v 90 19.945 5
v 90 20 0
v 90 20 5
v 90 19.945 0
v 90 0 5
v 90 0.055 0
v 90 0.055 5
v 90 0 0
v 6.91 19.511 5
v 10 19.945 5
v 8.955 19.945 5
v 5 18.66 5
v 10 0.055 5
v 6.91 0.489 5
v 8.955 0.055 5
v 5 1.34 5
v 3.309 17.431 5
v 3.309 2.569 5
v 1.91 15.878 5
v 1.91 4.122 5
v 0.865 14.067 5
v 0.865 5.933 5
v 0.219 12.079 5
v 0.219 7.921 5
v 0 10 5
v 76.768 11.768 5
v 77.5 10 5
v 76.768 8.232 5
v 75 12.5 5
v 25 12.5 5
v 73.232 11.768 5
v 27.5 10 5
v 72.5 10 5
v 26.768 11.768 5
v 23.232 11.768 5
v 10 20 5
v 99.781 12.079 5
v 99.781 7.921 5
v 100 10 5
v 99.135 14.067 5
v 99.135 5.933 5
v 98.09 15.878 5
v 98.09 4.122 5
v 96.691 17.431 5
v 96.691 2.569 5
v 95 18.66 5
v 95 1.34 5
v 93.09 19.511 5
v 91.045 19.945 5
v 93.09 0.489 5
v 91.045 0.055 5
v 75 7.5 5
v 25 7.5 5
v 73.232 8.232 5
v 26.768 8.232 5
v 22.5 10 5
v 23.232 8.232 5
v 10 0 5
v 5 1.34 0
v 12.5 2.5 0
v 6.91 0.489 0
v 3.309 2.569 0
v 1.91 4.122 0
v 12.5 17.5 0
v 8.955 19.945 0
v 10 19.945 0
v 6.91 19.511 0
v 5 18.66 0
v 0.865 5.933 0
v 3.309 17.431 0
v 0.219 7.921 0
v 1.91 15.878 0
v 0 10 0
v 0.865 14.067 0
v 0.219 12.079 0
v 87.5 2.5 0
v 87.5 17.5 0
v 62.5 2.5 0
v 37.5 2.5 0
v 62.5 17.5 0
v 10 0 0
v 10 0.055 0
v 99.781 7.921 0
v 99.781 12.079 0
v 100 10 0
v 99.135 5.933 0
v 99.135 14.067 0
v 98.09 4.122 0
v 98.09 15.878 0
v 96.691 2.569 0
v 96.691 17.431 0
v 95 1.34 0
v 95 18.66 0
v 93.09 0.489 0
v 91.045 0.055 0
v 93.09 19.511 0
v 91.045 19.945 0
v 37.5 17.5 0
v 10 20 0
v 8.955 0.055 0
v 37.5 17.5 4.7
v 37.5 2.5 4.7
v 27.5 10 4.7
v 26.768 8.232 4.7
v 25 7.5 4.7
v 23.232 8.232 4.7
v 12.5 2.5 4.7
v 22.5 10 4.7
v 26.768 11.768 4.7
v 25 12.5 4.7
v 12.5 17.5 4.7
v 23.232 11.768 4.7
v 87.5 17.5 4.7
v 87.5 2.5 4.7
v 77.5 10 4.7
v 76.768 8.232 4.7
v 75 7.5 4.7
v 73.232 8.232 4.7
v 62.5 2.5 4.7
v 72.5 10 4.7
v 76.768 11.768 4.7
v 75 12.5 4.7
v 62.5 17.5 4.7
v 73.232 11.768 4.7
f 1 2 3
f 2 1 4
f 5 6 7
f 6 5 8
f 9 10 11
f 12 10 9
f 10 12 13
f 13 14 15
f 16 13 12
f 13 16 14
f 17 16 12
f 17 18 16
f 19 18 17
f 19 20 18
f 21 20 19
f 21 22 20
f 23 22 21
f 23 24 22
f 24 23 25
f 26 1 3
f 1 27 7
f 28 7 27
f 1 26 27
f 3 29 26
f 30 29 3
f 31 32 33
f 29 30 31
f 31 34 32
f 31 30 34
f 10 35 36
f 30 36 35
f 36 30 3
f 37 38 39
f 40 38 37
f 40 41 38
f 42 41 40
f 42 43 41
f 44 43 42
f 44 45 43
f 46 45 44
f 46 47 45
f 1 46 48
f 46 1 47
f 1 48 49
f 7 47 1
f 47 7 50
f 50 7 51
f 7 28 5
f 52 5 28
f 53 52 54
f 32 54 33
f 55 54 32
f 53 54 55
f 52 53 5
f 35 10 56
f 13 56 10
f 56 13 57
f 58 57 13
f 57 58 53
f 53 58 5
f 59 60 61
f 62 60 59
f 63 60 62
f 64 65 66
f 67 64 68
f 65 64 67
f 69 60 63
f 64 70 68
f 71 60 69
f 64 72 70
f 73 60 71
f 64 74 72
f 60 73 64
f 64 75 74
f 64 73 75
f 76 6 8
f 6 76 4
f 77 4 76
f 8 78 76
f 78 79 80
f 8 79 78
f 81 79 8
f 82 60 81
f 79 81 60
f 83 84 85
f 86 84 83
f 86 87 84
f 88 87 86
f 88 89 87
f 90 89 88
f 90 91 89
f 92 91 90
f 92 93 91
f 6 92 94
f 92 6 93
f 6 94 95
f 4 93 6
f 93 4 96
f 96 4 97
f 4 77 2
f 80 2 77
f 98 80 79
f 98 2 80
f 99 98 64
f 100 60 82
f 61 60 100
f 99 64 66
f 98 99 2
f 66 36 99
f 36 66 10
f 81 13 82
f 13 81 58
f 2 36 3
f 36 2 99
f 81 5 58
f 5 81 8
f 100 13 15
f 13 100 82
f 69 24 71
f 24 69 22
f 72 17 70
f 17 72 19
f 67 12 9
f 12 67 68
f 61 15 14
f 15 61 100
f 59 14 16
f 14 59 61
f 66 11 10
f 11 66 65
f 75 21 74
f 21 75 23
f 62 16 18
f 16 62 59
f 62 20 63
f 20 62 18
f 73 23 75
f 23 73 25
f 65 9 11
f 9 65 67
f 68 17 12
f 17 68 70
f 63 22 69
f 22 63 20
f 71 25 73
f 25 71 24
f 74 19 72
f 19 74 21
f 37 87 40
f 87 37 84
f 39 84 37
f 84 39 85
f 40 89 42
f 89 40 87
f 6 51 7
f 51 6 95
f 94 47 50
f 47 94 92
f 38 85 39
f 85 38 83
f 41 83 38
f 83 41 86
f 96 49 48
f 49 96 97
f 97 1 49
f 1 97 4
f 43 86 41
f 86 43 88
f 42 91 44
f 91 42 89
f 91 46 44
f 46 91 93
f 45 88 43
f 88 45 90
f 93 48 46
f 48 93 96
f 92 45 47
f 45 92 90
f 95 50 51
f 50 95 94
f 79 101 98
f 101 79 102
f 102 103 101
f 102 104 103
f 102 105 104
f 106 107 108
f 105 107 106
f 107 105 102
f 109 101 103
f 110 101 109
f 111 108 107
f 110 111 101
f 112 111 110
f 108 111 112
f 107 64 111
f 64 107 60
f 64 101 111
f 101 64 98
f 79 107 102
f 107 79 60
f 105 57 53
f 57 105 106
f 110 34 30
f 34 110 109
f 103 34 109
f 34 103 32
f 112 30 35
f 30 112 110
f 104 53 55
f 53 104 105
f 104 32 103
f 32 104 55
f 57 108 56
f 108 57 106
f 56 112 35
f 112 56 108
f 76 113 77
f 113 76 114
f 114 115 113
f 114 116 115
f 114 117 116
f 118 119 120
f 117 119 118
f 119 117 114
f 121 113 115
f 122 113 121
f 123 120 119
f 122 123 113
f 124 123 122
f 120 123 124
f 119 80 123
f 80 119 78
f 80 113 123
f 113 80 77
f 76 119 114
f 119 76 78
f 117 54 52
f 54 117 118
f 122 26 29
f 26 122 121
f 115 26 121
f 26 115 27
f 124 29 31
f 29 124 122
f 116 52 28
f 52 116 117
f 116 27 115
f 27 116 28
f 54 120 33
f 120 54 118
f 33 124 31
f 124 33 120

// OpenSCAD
base_x = 100;
base_y = 20;
base_z = 5;

screw_x = 25;
screw_y = 15;
screw_z = 4.7;

screw_dist = 50;
hole_d=5;

module screw() {
  cube([screw_x, screw_y, screw_z]);
  translate([0.5*screw_x, 0.5*screw_y, 0]) cylinder(d=hole_d, h=3*base_z);
}
module screws() {
screw();
translate([screw_dist, 0, 0]) screw();
}

module base() {
  translate([0.5*base_y, 0, 0]) cube([base_x-base_y, base_y, base_z]);
  translate([0.5*base_y, 0.5*base_y, 0]) cylinder(d=base_y, h=base_z);
  translate([base_x-0.5*base_y, 0.5*base_y, 0]) cylinder(d=base_y, h=base_z);
  
  
}

module main() {
difference(){
  base();
  translate([0.5*(base_x-(screw_dist+screw_x)), 0.5*(base_y-screw_y), 0]) screws();
}
}
main();
